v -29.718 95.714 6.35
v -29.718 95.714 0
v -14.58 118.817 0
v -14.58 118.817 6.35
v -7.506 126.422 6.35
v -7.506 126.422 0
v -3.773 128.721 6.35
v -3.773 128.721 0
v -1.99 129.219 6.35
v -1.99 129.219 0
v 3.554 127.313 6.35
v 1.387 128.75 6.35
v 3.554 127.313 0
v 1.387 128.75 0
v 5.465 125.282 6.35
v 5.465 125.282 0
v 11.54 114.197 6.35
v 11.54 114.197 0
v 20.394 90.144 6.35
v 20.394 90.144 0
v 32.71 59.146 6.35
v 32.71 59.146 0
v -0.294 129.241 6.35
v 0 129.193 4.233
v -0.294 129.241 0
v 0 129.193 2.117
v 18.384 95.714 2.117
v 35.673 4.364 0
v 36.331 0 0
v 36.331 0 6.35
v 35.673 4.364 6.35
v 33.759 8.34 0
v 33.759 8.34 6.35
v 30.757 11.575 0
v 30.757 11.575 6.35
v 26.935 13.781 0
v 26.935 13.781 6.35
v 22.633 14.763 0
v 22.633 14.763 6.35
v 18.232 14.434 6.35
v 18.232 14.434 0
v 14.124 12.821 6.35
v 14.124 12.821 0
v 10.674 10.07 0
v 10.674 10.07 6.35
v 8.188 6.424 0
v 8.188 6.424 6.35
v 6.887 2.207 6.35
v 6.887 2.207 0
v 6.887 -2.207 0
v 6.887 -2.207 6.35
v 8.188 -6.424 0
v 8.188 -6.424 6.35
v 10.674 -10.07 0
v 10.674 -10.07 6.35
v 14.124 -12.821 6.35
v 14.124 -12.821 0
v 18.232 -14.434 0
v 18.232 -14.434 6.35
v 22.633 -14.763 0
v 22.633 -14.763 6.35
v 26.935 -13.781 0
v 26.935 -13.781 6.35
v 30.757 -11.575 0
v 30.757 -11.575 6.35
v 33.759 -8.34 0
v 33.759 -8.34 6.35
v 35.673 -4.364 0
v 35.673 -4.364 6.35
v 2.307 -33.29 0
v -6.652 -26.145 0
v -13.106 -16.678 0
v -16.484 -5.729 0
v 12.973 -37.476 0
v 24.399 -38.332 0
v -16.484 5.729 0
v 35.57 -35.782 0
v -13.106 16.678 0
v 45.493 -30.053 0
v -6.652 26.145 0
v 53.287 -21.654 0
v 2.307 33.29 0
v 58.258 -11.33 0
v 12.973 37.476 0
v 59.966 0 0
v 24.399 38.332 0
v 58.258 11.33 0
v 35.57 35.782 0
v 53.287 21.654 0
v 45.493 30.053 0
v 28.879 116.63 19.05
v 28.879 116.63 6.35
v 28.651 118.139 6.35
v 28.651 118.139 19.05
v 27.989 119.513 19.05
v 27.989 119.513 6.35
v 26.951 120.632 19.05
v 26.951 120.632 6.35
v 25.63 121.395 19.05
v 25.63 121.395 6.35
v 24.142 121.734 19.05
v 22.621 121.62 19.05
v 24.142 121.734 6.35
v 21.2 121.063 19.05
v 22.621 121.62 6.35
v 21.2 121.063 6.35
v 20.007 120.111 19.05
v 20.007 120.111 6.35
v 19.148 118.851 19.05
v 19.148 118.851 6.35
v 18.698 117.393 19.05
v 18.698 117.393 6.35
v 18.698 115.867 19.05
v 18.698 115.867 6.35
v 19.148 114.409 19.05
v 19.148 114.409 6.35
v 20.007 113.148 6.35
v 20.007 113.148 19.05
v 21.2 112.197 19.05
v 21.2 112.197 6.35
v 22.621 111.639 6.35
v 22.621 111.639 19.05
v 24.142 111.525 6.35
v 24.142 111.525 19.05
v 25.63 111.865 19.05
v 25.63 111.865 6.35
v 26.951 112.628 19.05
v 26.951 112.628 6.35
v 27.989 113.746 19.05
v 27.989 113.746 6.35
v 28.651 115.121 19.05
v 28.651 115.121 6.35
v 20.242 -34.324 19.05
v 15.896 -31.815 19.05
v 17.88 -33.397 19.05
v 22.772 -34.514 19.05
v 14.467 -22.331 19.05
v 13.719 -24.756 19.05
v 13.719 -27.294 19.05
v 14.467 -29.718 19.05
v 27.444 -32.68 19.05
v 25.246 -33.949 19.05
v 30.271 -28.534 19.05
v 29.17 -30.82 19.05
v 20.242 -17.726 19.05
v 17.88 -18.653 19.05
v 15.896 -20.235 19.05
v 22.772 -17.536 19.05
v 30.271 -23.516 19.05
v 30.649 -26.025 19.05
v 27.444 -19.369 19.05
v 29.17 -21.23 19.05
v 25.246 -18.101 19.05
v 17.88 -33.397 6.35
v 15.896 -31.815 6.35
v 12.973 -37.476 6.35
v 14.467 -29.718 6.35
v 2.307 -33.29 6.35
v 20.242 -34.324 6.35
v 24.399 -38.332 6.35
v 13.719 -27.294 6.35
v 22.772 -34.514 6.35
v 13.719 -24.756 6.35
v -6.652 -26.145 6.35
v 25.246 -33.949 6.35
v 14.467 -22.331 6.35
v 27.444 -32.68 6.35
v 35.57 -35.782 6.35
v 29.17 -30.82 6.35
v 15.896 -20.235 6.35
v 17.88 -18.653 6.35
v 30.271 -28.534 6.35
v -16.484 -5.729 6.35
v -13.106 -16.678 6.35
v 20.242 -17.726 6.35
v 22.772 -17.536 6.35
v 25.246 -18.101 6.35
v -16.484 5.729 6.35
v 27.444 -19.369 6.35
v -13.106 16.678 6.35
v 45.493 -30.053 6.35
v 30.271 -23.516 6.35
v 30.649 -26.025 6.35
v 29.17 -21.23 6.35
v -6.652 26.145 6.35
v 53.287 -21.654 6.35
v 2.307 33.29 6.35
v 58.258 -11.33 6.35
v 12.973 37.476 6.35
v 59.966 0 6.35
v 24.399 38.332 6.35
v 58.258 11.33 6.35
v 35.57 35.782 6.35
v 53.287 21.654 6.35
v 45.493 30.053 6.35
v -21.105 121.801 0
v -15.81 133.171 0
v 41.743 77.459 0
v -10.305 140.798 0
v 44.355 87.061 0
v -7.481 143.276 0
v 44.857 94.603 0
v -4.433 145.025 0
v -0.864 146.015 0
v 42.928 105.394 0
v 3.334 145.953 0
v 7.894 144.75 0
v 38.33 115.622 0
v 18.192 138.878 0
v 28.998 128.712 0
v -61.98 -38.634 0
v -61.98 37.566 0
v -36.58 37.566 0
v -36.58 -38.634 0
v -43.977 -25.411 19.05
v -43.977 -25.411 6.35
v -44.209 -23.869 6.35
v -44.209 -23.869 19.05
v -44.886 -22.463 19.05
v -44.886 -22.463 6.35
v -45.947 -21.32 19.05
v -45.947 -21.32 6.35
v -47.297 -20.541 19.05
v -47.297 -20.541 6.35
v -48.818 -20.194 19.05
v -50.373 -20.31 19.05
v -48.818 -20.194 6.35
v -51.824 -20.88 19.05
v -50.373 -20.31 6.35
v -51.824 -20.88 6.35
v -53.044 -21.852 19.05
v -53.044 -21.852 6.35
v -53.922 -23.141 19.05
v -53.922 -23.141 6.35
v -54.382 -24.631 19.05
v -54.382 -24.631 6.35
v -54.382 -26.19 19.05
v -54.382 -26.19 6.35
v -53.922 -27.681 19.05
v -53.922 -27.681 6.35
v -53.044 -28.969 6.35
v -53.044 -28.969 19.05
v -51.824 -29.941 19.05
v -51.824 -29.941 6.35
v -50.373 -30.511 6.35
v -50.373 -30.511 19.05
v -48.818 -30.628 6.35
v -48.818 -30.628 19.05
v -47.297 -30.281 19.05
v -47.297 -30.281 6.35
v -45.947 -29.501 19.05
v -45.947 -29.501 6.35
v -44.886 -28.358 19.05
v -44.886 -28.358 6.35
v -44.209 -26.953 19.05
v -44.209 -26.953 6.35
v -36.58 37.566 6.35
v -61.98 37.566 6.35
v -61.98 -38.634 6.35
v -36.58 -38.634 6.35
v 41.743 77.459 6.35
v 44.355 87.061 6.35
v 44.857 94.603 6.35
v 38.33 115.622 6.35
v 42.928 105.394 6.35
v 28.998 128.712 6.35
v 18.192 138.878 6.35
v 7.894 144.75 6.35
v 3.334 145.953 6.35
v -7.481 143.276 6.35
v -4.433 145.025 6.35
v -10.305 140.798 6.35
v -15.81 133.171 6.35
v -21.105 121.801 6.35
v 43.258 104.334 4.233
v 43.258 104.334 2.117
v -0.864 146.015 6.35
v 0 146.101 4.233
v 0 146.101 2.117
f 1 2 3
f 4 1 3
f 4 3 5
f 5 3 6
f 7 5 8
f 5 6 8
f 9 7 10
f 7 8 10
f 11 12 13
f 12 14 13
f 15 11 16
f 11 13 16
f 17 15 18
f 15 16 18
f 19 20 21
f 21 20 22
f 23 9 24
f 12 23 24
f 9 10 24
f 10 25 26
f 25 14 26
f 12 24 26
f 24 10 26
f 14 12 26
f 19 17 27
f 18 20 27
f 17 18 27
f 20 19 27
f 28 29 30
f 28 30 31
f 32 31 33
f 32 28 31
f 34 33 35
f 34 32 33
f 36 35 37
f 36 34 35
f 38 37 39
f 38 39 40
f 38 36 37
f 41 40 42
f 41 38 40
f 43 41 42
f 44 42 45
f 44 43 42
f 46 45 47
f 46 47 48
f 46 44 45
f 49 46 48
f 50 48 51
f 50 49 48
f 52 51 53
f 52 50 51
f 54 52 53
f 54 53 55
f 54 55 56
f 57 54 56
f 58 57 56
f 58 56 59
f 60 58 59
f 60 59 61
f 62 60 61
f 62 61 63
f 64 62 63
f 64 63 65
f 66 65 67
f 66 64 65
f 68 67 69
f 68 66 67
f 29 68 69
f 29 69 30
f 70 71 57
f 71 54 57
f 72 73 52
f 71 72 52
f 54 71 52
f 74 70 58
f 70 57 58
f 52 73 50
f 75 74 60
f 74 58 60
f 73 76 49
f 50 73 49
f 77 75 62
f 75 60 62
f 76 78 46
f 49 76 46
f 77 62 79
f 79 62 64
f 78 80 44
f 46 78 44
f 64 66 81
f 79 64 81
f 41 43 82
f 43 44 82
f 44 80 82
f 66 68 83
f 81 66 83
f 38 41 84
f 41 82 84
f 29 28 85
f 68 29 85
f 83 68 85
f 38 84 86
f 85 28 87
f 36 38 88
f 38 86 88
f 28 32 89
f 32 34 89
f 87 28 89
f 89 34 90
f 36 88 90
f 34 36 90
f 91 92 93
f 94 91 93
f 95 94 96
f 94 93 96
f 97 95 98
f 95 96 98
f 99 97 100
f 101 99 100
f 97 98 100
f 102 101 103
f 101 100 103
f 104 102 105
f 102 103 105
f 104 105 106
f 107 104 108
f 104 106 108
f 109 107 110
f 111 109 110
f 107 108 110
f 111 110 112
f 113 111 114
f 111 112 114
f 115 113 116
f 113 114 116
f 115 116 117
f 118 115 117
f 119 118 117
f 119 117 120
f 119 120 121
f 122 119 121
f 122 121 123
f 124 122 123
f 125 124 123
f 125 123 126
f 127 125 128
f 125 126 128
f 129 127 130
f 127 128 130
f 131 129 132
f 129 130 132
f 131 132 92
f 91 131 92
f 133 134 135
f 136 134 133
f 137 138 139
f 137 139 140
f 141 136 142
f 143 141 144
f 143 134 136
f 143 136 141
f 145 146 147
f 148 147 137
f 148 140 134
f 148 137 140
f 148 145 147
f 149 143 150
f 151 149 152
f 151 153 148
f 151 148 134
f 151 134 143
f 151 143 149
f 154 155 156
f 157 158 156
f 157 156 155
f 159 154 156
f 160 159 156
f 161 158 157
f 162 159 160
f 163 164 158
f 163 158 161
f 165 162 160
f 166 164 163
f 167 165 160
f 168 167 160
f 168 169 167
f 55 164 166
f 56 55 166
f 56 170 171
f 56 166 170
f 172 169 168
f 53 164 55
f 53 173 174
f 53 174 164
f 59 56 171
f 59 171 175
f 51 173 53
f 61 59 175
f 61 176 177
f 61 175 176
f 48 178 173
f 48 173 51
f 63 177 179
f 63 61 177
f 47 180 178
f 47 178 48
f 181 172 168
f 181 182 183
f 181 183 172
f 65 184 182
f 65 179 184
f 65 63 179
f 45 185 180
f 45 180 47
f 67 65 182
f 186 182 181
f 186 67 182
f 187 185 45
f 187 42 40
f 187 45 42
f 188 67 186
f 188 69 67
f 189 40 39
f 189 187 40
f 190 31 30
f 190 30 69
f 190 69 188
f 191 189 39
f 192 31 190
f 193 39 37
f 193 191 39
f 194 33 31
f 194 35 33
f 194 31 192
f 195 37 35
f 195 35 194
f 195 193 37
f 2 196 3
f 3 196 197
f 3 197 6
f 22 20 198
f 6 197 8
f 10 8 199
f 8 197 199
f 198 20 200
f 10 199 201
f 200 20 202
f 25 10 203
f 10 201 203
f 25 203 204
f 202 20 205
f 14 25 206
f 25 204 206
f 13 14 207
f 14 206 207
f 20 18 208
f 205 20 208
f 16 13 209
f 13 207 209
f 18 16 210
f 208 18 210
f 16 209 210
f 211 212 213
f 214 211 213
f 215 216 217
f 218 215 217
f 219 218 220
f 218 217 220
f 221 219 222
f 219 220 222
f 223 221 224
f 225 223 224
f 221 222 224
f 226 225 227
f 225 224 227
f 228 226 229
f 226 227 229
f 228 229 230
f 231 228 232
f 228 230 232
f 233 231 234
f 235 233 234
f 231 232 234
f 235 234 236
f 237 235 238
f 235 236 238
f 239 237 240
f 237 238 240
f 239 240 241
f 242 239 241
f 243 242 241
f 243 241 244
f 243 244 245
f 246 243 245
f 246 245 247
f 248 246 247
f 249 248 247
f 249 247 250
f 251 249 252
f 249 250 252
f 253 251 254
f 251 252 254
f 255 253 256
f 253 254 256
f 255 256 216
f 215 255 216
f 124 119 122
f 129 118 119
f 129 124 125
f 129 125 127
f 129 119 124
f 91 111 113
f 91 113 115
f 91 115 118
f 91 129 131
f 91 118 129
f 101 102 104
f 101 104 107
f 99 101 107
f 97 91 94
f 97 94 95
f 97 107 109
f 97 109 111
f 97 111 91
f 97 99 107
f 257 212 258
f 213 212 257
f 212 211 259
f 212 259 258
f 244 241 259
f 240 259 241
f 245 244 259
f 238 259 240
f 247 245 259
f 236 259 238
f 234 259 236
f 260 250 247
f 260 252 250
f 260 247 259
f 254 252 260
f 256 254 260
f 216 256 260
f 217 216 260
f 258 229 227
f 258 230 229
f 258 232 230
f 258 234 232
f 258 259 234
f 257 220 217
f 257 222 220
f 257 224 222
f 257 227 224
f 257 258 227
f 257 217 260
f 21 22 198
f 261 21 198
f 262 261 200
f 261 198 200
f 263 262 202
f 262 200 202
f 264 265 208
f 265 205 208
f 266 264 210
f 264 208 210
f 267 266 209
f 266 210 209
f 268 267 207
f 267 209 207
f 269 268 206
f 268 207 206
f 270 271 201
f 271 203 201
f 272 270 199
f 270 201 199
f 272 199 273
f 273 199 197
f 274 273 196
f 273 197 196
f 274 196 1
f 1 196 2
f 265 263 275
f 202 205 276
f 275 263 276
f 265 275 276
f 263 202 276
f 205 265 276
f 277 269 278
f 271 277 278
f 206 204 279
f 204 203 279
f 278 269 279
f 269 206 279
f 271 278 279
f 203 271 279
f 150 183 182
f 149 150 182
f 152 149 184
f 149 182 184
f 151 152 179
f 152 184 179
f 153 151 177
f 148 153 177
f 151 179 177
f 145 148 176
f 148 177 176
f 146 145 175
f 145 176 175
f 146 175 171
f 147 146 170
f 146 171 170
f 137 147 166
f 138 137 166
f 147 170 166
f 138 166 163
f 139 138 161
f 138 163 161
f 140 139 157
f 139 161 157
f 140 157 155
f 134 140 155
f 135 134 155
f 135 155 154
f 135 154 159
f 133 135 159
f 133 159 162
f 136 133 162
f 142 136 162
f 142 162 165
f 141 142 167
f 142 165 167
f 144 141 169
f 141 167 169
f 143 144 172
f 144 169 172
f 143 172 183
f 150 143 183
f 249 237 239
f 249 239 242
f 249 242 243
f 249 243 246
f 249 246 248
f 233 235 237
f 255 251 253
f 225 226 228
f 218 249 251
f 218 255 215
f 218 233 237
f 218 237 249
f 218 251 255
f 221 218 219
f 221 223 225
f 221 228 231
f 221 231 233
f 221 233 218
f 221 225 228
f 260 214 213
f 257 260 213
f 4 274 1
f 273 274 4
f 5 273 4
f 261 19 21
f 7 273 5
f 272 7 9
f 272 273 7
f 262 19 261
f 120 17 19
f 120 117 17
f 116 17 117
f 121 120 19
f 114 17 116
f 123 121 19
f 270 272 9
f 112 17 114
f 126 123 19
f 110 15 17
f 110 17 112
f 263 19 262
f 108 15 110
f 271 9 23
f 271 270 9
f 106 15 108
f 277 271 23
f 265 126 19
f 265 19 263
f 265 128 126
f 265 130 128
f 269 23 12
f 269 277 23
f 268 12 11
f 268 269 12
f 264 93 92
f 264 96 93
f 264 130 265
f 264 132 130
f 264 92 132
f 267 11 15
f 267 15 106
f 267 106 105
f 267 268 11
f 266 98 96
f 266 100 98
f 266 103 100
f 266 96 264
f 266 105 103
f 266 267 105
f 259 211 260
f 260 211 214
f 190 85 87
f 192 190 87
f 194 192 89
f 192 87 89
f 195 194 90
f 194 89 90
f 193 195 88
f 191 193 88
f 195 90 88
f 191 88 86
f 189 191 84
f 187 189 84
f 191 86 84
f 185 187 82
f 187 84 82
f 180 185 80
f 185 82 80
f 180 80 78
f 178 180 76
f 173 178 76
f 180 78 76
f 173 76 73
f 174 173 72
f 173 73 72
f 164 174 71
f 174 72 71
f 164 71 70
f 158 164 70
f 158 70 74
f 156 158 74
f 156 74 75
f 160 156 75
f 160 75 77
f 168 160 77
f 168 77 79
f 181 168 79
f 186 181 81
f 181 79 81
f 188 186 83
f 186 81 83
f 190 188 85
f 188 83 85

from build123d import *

# Parameters (mm, degrees)
F0_W     = 25.4
F0_H     = 76.2
F1_DEPTH = 6.35
F0_R     = 38.4394579133
F0_R_2   = 14.8046934969
F2_R     = 5.2316610028
F3_DEPTH = 12.7
F2_R_2   = 8.5125938891
F2_R_3   = 5.1188797051


with BuildPart() as f1:
    # F0 (on Top) → F1 (new body)
    with BuildSketch(Plane.XY):
        with Locations((-49.2798545945, -0.5338639021)):
            Rectangle(F0_W, F0_H)
    extrude(amount=F1_DEPTH)

    # F2 (on face) → F3 (join)
    with BuildSketch(Plane.XY.offset(6.35)):
        with Locations((-49.2086187005, -25.410592556)):
            Circle(F2_R)
    extrude(amount=F3_DEPTH)


with BuildPart() as f1b:
    # F0 (on Top) → F1, piece 2 (new body)
    with BuildSketch(Plane.XY):
        with Locations((21.5263813734, 0)):
            Circle(F0_R)
        with Locations((21.5263813734, 0)):
            Circle(F0_R_2, mode=Mode.SUBTRACT)
    extrude(amount=F1_DEPTH)

    # F2 (on face) → F3, piece 2 (join)
    with BuildSketch(Plane.XY.offset(6.35)):
        with Locations((22.1362113953, -26.0249078274)):
            Circle(F2_R_2)
    extrude(amount=F3_DEPTH)


with BuildPart() as f1c:
    # F0 (on Top) → F1, piece 3 (new body)
    with BuildSketch(Plane.XY):
        with BuildLine():
            add(Edge.make_bspline(
                [(-29.7179743648, 95.7142338157), (-19.0131454807, 113.233737551), (1.5796451251, 146.9358558674), (19.0124895635, 92.0655705958), (28.123248858, 70.1702824146), (32.7103585005, 59.1463893652)],
                knots=[0, 0, 0, 0, 0.3496087633, 0.6725394057, 1, 1, 1, 1], degree=3))
            add(Edge.make_bspline(
                [(32.7103585005, 59.1463893652), (40.5245970676, 73.2035069742), (57.2342930122, 103.2627499743), (-7.2032755891, 170.1391956814), (-22.2476159218, 120.4084125144), (-29.7179743648, 95.7142338157)],
                knots=[0, 0, 0, 0, 0.3066393633, 0.6557067286, 1, 1, 1, 1], degree=3))
        make_face()
    extrude(amount=F1_DEPTH)

    # F2 (on face) → F3, piece 3 (join)
    with BuildSketch(Plane.XY.offset(6.35)):
        with Locations((23.7596780062, 116.629704833)):
            Circle(F2_R_3)
    extrude(amount=F3_DEPTH)


solid = Compound([f1.part, f1b.part, f1c.part])
